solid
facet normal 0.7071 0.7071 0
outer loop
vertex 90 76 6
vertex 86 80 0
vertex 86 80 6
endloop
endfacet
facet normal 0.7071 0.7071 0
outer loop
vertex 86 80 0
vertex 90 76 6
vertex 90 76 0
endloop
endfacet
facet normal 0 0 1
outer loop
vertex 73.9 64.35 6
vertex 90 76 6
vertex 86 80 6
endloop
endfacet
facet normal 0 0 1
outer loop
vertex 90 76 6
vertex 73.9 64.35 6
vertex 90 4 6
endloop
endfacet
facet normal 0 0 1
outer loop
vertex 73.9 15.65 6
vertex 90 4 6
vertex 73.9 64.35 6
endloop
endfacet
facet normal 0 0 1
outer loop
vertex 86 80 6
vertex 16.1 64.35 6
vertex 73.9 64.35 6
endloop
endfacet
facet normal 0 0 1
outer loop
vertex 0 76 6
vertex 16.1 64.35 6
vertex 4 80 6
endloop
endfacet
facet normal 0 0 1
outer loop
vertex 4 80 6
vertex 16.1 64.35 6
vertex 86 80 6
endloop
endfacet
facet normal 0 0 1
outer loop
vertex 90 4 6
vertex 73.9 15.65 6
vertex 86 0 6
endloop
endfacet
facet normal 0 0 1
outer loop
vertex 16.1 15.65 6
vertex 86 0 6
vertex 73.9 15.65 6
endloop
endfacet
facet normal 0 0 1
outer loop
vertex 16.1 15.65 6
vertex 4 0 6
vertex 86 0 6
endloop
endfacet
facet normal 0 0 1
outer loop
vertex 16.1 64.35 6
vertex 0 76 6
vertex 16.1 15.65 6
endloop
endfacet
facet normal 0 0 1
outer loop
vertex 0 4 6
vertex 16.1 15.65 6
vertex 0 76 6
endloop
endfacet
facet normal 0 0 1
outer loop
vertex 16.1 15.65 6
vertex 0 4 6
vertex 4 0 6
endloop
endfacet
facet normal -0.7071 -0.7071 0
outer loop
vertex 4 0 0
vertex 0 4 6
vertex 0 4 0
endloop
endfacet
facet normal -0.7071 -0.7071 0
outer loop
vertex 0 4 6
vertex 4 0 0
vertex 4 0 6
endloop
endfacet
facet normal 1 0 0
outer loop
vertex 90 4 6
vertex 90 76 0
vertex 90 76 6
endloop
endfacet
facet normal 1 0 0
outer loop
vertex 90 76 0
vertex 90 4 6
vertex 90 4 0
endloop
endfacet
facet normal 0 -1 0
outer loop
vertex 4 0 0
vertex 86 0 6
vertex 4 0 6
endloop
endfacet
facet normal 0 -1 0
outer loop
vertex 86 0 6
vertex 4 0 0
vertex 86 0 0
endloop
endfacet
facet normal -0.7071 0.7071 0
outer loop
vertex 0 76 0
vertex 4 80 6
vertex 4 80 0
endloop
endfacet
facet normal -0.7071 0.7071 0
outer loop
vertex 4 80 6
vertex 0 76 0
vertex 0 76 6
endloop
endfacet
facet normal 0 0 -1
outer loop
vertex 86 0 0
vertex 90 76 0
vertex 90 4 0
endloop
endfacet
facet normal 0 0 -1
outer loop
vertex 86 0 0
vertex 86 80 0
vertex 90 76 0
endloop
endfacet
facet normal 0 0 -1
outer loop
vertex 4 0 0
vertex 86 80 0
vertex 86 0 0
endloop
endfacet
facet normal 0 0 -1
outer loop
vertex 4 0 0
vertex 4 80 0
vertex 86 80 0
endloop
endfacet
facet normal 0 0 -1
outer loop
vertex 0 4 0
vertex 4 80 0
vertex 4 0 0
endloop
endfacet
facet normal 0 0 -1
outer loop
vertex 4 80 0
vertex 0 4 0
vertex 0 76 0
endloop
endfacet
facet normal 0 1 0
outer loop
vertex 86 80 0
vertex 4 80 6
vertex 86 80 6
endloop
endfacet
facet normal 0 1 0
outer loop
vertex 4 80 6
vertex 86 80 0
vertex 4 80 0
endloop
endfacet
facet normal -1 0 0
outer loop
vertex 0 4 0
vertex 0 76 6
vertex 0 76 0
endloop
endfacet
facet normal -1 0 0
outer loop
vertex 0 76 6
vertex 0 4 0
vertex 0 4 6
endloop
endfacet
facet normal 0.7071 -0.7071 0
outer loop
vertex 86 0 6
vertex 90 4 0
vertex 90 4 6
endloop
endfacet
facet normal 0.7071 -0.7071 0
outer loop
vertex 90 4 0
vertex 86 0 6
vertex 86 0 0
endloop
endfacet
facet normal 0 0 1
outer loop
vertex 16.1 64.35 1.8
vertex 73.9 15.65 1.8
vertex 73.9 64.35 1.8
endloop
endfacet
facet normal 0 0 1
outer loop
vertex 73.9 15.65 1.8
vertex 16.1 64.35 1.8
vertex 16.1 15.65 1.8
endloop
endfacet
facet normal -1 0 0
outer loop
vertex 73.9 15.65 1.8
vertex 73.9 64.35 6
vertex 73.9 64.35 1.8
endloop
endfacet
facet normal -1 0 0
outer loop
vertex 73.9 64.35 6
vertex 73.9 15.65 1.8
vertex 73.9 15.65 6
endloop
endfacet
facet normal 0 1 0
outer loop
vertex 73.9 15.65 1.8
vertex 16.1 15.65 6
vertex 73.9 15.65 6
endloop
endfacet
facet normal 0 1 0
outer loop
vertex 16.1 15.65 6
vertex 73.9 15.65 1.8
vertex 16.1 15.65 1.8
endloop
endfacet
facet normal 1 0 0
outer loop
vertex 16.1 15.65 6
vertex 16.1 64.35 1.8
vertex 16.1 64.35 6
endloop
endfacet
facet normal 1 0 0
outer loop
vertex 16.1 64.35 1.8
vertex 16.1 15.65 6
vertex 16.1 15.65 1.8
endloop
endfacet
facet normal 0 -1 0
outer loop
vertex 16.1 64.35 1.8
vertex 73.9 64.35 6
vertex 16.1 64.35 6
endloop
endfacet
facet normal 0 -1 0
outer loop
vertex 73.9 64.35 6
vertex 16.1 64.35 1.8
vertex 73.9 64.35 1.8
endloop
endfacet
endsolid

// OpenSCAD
$fn = 32;

// ----------------------------------------------------------------------
// Windowed plate: 1 voids, 90 x 80 x 6 mm
// ----------------------------------------------------------------------

// --- parameters (mm) ---
plate_l = 90;             // plate length, X
plate_w = 80;             // plate width, Y
plate_t = 6;              // plate thickness, Z
edge_margin = 12;         // wall from the plate edge to any window
win1_l = 57.8;            // window length
win1_w = 48.7;            // window width
depth_1 = 4.2;            // depth of void 1 (full thickness = through)
corner_c = 4;             // corner chamfer of the plate

profile = [[4, 0], [86, 0], [90, 4], [90, 76], [86, 80], [4, 80], [0, 76], [0, 4]];  // primary outline, 8 points, counter clockwise
void_1 = [[16.1, 15.65], [73.9, 15.65], [73.9, 64.35], [16.1, 64.35]];  // large central window, 4 points

// --- the one profile operation ---
difference() {
  linear_extrude(height = plate_t) polygon(points = profile);
  translate([0, 0, plate_t - depth_1])
    linear_extrude(height = depth_1 + 1) polygon(points = void_1);
}
